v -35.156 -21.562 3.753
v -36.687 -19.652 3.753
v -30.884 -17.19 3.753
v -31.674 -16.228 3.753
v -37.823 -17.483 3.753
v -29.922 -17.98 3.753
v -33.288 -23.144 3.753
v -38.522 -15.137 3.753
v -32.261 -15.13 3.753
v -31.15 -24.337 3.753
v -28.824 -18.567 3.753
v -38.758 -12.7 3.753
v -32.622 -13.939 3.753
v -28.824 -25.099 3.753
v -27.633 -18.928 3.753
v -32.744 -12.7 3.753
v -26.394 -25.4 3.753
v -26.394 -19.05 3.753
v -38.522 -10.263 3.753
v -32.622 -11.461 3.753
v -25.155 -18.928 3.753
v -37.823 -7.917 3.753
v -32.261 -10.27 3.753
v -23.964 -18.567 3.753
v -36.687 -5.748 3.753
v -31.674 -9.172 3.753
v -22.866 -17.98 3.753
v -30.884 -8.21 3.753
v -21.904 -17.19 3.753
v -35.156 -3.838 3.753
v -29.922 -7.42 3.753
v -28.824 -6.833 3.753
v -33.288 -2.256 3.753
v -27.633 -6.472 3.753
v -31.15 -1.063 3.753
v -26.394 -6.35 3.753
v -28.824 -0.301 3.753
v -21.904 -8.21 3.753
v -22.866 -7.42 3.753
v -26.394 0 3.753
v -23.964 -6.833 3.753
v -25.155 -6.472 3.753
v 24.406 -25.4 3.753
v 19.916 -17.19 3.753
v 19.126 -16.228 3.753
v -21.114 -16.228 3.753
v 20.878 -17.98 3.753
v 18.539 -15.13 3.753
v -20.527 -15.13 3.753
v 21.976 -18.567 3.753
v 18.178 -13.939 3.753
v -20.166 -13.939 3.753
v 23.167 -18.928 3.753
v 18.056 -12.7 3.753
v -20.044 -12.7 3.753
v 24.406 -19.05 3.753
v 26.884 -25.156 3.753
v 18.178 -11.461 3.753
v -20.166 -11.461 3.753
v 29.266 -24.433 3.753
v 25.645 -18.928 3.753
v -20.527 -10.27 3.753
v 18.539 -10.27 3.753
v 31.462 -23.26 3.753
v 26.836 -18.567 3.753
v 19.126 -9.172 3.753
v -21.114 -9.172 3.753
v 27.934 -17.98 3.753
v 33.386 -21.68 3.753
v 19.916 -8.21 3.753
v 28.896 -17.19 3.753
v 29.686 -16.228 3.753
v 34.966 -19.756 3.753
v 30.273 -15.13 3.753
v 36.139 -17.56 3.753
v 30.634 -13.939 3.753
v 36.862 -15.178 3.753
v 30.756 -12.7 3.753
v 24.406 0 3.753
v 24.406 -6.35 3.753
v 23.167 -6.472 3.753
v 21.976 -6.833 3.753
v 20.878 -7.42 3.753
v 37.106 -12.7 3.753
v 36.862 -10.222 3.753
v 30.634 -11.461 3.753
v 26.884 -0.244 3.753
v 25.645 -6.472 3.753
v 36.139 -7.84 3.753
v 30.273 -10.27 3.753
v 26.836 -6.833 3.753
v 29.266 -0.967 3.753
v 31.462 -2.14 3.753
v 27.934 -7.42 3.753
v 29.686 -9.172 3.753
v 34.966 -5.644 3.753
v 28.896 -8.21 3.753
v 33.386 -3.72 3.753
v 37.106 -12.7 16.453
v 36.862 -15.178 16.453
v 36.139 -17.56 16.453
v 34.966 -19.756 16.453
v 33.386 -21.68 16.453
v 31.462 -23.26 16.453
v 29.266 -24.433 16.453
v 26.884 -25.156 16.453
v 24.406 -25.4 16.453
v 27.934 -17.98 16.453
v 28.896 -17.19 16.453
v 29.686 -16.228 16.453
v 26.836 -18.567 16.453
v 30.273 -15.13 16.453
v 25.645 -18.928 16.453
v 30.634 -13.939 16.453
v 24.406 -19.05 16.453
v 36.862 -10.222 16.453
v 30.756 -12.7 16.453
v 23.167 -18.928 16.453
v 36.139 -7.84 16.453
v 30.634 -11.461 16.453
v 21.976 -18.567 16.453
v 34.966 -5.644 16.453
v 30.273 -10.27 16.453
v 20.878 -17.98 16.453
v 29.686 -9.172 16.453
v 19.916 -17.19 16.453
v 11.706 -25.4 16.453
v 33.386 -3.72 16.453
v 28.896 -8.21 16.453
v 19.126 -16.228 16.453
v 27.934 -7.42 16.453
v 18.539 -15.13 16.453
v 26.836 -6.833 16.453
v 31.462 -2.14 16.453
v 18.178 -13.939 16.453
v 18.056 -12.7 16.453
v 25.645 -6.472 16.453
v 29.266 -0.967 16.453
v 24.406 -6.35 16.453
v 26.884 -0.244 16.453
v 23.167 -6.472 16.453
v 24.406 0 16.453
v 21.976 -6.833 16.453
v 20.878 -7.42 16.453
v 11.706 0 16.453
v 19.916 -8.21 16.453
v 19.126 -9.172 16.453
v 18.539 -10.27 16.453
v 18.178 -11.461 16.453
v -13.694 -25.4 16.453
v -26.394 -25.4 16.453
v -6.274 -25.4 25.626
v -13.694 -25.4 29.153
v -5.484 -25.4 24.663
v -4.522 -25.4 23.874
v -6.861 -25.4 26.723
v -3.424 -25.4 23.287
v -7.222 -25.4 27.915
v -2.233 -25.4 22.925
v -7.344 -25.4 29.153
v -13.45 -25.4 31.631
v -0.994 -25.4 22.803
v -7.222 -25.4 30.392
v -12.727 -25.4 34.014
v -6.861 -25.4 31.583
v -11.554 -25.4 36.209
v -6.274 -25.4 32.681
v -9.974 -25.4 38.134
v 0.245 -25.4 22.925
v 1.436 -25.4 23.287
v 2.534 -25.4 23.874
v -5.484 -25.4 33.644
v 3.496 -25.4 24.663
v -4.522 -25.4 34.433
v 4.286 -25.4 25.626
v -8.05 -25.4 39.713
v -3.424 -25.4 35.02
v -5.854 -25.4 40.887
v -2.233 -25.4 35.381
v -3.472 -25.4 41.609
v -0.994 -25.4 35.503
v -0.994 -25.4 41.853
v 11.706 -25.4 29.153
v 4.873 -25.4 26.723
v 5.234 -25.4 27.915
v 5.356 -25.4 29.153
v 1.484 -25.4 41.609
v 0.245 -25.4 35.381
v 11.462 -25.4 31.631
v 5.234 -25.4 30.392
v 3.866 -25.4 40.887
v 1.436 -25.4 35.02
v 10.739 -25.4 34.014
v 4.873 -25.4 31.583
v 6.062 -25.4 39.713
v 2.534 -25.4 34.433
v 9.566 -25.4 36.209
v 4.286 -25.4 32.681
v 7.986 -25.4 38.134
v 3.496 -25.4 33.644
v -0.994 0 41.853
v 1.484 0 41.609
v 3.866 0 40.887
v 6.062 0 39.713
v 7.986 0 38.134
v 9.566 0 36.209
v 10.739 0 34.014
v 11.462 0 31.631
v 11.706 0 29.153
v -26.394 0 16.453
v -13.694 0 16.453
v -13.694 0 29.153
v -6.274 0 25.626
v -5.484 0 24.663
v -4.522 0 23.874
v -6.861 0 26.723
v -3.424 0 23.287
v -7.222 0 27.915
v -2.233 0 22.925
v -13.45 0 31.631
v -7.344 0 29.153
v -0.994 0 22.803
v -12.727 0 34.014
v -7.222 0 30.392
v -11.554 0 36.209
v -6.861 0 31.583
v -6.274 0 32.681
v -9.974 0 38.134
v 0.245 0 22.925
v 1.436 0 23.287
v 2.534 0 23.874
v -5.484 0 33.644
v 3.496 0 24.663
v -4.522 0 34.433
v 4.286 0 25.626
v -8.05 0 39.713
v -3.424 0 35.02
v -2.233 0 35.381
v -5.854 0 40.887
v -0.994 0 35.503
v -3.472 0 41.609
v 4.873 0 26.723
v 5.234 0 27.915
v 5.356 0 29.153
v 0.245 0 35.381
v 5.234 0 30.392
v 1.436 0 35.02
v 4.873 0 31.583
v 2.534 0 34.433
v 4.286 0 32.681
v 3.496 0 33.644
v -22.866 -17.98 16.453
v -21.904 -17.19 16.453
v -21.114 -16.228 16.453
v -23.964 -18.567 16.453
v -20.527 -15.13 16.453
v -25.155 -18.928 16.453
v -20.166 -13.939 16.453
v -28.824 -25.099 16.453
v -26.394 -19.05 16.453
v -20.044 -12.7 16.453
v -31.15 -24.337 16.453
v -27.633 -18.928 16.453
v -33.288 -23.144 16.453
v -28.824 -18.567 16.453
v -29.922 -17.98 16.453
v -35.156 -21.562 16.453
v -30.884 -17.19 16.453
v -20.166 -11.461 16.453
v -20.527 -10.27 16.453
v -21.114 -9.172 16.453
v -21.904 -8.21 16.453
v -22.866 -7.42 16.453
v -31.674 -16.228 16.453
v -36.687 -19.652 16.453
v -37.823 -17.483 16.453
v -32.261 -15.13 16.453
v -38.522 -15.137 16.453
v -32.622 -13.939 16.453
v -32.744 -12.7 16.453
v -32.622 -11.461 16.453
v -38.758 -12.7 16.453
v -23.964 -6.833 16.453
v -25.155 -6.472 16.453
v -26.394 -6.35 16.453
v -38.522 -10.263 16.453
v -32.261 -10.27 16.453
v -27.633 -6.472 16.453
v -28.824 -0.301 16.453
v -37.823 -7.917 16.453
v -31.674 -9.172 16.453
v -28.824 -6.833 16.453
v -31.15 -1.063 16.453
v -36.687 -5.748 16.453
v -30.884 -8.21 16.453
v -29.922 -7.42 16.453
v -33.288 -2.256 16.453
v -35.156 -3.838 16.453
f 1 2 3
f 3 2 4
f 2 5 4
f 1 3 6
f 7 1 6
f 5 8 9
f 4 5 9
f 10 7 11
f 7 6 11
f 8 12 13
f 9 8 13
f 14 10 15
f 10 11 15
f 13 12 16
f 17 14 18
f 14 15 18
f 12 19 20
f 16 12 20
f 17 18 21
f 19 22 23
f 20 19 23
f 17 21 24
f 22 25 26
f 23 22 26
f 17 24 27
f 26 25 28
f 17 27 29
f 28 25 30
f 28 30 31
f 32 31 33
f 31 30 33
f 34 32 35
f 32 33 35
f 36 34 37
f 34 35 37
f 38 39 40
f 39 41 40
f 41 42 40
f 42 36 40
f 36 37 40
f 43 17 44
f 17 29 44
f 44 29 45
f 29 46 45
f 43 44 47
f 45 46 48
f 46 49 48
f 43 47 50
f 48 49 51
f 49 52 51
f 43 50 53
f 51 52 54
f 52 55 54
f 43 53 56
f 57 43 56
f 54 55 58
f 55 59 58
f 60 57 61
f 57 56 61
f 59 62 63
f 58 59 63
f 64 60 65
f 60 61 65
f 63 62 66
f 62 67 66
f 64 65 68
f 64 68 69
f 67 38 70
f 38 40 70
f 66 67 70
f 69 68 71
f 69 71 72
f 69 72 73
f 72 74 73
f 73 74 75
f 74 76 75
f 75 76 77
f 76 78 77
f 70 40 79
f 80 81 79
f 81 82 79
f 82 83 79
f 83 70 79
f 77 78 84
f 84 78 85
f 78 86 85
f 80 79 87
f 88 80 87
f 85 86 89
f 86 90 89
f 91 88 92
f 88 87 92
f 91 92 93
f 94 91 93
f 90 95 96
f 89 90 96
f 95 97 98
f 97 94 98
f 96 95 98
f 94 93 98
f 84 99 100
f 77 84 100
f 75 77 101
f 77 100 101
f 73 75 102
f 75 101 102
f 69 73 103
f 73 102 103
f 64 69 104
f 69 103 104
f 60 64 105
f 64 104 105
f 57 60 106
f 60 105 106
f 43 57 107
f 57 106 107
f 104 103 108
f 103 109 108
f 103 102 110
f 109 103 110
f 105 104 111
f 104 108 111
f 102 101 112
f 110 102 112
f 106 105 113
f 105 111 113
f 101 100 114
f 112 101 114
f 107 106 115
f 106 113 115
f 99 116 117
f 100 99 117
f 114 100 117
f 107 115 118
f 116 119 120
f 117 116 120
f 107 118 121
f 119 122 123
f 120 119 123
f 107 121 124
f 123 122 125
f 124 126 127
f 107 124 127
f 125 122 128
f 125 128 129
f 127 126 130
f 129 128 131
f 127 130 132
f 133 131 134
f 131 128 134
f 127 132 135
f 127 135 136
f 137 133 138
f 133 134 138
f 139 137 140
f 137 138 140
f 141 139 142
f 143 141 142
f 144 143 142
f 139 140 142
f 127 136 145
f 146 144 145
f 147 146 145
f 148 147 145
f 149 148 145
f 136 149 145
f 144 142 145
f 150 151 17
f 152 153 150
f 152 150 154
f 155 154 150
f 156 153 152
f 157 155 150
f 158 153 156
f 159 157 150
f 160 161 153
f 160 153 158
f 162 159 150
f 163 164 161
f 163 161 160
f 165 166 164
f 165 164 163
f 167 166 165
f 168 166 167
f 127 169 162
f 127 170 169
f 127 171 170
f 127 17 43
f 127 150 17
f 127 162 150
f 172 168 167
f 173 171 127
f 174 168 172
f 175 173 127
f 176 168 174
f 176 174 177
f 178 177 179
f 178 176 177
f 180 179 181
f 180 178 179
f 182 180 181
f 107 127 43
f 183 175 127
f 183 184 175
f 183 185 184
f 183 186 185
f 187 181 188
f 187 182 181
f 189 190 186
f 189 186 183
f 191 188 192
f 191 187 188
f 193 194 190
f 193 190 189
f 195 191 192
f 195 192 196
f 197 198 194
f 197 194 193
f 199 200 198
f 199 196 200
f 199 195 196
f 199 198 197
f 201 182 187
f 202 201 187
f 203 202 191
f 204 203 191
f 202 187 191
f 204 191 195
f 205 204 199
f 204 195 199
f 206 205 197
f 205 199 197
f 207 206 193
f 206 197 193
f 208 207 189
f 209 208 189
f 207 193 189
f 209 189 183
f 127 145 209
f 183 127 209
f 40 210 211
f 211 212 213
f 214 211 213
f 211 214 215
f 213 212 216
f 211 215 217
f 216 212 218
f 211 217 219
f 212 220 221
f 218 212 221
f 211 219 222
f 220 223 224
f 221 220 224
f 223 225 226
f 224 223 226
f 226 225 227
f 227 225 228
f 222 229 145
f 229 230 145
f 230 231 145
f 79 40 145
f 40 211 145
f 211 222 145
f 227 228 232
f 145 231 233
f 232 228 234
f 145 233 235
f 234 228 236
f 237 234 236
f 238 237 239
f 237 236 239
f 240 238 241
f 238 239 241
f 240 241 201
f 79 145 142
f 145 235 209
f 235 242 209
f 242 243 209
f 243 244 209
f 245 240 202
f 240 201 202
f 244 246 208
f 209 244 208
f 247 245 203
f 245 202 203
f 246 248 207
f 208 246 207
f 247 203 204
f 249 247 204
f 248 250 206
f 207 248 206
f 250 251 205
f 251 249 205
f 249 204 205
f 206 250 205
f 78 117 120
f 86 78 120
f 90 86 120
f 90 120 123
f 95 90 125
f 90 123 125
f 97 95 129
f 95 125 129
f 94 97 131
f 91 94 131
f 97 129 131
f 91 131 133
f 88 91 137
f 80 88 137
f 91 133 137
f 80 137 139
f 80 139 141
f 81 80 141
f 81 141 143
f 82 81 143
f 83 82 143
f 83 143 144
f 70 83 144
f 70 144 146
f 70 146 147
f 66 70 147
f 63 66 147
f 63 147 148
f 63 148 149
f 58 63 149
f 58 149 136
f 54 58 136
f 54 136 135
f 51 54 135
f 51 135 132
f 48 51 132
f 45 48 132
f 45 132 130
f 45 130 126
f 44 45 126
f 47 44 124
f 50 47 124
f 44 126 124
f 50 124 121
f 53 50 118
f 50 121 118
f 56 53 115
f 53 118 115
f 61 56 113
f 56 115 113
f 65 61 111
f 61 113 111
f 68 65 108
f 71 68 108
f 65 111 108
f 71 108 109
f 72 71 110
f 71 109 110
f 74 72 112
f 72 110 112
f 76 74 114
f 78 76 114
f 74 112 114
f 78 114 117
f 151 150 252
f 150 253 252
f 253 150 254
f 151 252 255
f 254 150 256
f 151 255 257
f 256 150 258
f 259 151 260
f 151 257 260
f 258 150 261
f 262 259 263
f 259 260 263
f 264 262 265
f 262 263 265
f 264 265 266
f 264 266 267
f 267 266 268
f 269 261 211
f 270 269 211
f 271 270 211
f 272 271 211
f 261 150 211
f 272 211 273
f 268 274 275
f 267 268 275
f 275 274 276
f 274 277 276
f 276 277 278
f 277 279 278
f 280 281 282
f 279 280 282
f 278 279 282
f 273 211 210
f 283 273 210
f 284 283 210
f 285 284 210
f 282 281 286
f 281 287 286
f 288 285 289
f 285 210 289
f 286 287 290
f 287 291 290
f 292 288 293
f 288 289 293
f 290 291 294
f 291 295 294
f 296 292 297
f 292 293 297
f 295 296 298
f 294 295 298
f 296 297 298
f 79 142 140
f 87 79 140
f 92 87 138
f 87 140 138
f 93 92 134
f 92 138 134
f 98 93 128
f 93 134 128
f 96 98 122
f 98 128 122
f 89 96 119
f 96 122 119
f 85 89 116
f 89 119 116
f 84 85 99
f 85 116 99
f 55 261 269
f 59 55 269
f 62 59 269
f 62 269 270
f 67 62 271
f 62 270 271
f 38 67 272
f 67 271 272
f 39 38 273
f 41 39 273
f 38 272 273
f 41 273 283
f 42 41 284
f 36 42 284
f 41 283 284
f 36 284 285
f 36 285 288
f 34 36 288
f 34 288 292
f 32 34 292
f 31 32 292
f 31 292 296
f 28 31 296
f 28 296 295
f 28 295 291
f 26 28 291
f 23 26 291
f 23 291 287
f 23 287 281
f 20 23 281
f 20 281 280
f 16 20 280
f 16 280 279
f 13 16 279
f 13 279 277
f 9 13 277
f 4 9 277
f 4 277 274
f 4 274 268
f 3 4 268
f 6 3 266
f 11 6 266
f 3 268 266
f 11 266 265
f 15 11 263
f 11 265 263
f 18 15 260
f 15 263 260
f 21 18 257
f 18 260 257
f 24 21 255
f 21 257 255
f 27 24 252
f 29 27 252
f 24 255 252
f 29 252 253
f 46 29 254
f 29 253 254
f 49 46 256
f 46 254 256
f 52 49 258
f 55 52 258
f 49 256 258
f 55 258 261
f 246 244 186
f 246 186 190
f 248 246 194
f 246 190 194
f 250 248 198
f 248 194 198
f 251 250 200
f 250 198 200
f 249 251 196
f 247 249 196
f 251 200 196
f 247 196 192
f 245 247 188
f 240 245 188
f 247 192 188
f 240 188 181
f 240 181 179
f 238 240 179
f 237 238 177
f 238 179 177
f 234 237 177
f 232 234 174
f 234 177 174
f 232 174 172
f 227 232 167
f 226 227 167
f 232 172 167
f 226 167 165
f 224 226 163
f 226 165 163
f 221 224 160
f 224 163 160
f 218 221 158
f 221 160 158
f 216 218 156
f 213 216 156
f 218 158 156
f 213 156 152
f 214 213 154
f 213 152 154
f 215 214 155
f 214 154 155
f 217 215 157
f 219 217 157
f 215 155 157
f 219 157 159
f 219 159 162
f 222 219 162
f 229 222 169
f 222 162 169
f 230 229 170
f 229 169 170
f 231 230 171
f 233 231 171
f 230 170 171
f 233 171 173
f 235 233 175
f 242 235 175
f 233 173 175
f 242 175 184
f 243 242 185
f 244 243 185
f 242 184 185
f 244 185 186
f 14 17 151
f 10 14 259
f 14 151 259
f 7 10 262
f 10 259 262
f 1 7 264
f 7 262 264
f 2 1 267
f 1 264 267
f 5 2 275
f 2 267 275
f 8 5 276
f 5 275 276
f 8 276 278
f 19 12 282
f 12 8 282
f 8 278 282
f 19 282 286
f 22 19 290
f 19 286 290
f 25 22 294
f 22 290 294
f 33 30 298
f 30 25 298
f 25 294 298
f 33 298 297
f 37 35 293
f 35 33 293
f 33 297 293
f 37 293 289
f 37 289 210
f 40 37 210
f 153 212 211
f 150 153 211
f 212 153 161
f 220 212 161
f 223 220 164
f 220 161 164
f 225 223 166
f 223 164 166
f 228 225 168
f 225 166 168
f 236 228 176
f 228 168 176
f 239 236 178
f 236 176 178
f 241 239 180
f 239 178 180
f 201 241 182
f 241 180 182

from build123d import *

# Parameters (mm, degrees)
F1_DEPTH = 25.4
F2_R     = 6.35
F3_DEPTH = 25.4
F4_R     = 6.35
F5_DEPTH = 25.4
F6_R     = 6.35
F7_DEPTH = 25.4


with BuildPart() as f1:
    # F0 (on Front) → F1 (new body)
    with BuildSketch(Plane.XZ):
        Polygon((-13.694073, 16.45344), (-39.094073, 16.45344), (-39.094073, 3.75344), (37.105927, 3.75344), (37.105927, 16.45344), (11.705927, 16.45344), (11.705927, 41.85344), (-13.694073, 41.85344), align=None)
    extrude(amount=F1_DEPTH)

    # F2 (on face) → F3 (cut)
    with BuildSketch(Plane.XZ.offset(25.4)):
        with Locations((-0.994073, 29.15344)):
            Circle(F2_R)
        with BuildLine():
            ThreePointArc((-13.694073, 29.15344), (-9.974329, 38.133696), (-0.994073, 41.85344))
            Line((-0.994073, 41.85344), (-13.694073, 41.85344))
            Line((-13.694073, 41.85344), (-13.694073, 29.15344))
        make_face()
        with BuildLine():
            ThreePointArc((-0.994073, 41.85344), (7.986183, 38.133696), (11.705927, 29.15344))
            Line((11.705927, 29.15344), (11.705927, 41.85344))
            Line((11.705927, 41.85344), (-0.994073, 41.85344))
        make_face()
    extrude(amount=-F3_DEPTH, mode=Mode.SUBTRACT)

    # F4 (on face) → F5 (cut)
    with BuildSketch(Plane.XY.offset(16.45344)):
        with Locations((-26.394073, -12.7)):
            Circle(F4_R)
        with BuildLine():
            ThreePointArc((-26.394073, -25.4), (-38.757753, -12.7), (-26.394073, 0))
            Line((-26.394073, 0), (-39.094073, 0))
            Line((-39.094073, 0), (-39.094073, -25.4))
            Line((-39.094073, -25.4), (-26.394073, -25.4))
        make_face()
    extrude(amount=-F5_DEPTH, mode=Mode.SUBTRACT)

    # F6 (on face) → F7 (cut)
    with BuildSketch(Plane.XY.offset(16.45344)):
        with Locations((24.405927, -12.7)):
            Circle(F6_R)
        with BuildLine():
            ThreePointArc((24.405927, 0), (33.386183, -3.719744), (37.105927, -12.7))
            Line((37.105927, -12.7), (37.105927, 0))
            Line((37.105927, 0), (24.405927, 0))
        make_face()
        with BuildLine():
            ThreePointArc((37.105927, -12.7), (33.386183, -21.680256), (24.405927, -25.4))
            Line((24.405927, -25.4), (37.105927, -25.4))
            Line((37.105927, -25.4), (37.105927, -12.7))
        make_face()
    extrude(amount=-F7_DEPTH, mode=Mode.SUBTRACT)


solid = f1.part
